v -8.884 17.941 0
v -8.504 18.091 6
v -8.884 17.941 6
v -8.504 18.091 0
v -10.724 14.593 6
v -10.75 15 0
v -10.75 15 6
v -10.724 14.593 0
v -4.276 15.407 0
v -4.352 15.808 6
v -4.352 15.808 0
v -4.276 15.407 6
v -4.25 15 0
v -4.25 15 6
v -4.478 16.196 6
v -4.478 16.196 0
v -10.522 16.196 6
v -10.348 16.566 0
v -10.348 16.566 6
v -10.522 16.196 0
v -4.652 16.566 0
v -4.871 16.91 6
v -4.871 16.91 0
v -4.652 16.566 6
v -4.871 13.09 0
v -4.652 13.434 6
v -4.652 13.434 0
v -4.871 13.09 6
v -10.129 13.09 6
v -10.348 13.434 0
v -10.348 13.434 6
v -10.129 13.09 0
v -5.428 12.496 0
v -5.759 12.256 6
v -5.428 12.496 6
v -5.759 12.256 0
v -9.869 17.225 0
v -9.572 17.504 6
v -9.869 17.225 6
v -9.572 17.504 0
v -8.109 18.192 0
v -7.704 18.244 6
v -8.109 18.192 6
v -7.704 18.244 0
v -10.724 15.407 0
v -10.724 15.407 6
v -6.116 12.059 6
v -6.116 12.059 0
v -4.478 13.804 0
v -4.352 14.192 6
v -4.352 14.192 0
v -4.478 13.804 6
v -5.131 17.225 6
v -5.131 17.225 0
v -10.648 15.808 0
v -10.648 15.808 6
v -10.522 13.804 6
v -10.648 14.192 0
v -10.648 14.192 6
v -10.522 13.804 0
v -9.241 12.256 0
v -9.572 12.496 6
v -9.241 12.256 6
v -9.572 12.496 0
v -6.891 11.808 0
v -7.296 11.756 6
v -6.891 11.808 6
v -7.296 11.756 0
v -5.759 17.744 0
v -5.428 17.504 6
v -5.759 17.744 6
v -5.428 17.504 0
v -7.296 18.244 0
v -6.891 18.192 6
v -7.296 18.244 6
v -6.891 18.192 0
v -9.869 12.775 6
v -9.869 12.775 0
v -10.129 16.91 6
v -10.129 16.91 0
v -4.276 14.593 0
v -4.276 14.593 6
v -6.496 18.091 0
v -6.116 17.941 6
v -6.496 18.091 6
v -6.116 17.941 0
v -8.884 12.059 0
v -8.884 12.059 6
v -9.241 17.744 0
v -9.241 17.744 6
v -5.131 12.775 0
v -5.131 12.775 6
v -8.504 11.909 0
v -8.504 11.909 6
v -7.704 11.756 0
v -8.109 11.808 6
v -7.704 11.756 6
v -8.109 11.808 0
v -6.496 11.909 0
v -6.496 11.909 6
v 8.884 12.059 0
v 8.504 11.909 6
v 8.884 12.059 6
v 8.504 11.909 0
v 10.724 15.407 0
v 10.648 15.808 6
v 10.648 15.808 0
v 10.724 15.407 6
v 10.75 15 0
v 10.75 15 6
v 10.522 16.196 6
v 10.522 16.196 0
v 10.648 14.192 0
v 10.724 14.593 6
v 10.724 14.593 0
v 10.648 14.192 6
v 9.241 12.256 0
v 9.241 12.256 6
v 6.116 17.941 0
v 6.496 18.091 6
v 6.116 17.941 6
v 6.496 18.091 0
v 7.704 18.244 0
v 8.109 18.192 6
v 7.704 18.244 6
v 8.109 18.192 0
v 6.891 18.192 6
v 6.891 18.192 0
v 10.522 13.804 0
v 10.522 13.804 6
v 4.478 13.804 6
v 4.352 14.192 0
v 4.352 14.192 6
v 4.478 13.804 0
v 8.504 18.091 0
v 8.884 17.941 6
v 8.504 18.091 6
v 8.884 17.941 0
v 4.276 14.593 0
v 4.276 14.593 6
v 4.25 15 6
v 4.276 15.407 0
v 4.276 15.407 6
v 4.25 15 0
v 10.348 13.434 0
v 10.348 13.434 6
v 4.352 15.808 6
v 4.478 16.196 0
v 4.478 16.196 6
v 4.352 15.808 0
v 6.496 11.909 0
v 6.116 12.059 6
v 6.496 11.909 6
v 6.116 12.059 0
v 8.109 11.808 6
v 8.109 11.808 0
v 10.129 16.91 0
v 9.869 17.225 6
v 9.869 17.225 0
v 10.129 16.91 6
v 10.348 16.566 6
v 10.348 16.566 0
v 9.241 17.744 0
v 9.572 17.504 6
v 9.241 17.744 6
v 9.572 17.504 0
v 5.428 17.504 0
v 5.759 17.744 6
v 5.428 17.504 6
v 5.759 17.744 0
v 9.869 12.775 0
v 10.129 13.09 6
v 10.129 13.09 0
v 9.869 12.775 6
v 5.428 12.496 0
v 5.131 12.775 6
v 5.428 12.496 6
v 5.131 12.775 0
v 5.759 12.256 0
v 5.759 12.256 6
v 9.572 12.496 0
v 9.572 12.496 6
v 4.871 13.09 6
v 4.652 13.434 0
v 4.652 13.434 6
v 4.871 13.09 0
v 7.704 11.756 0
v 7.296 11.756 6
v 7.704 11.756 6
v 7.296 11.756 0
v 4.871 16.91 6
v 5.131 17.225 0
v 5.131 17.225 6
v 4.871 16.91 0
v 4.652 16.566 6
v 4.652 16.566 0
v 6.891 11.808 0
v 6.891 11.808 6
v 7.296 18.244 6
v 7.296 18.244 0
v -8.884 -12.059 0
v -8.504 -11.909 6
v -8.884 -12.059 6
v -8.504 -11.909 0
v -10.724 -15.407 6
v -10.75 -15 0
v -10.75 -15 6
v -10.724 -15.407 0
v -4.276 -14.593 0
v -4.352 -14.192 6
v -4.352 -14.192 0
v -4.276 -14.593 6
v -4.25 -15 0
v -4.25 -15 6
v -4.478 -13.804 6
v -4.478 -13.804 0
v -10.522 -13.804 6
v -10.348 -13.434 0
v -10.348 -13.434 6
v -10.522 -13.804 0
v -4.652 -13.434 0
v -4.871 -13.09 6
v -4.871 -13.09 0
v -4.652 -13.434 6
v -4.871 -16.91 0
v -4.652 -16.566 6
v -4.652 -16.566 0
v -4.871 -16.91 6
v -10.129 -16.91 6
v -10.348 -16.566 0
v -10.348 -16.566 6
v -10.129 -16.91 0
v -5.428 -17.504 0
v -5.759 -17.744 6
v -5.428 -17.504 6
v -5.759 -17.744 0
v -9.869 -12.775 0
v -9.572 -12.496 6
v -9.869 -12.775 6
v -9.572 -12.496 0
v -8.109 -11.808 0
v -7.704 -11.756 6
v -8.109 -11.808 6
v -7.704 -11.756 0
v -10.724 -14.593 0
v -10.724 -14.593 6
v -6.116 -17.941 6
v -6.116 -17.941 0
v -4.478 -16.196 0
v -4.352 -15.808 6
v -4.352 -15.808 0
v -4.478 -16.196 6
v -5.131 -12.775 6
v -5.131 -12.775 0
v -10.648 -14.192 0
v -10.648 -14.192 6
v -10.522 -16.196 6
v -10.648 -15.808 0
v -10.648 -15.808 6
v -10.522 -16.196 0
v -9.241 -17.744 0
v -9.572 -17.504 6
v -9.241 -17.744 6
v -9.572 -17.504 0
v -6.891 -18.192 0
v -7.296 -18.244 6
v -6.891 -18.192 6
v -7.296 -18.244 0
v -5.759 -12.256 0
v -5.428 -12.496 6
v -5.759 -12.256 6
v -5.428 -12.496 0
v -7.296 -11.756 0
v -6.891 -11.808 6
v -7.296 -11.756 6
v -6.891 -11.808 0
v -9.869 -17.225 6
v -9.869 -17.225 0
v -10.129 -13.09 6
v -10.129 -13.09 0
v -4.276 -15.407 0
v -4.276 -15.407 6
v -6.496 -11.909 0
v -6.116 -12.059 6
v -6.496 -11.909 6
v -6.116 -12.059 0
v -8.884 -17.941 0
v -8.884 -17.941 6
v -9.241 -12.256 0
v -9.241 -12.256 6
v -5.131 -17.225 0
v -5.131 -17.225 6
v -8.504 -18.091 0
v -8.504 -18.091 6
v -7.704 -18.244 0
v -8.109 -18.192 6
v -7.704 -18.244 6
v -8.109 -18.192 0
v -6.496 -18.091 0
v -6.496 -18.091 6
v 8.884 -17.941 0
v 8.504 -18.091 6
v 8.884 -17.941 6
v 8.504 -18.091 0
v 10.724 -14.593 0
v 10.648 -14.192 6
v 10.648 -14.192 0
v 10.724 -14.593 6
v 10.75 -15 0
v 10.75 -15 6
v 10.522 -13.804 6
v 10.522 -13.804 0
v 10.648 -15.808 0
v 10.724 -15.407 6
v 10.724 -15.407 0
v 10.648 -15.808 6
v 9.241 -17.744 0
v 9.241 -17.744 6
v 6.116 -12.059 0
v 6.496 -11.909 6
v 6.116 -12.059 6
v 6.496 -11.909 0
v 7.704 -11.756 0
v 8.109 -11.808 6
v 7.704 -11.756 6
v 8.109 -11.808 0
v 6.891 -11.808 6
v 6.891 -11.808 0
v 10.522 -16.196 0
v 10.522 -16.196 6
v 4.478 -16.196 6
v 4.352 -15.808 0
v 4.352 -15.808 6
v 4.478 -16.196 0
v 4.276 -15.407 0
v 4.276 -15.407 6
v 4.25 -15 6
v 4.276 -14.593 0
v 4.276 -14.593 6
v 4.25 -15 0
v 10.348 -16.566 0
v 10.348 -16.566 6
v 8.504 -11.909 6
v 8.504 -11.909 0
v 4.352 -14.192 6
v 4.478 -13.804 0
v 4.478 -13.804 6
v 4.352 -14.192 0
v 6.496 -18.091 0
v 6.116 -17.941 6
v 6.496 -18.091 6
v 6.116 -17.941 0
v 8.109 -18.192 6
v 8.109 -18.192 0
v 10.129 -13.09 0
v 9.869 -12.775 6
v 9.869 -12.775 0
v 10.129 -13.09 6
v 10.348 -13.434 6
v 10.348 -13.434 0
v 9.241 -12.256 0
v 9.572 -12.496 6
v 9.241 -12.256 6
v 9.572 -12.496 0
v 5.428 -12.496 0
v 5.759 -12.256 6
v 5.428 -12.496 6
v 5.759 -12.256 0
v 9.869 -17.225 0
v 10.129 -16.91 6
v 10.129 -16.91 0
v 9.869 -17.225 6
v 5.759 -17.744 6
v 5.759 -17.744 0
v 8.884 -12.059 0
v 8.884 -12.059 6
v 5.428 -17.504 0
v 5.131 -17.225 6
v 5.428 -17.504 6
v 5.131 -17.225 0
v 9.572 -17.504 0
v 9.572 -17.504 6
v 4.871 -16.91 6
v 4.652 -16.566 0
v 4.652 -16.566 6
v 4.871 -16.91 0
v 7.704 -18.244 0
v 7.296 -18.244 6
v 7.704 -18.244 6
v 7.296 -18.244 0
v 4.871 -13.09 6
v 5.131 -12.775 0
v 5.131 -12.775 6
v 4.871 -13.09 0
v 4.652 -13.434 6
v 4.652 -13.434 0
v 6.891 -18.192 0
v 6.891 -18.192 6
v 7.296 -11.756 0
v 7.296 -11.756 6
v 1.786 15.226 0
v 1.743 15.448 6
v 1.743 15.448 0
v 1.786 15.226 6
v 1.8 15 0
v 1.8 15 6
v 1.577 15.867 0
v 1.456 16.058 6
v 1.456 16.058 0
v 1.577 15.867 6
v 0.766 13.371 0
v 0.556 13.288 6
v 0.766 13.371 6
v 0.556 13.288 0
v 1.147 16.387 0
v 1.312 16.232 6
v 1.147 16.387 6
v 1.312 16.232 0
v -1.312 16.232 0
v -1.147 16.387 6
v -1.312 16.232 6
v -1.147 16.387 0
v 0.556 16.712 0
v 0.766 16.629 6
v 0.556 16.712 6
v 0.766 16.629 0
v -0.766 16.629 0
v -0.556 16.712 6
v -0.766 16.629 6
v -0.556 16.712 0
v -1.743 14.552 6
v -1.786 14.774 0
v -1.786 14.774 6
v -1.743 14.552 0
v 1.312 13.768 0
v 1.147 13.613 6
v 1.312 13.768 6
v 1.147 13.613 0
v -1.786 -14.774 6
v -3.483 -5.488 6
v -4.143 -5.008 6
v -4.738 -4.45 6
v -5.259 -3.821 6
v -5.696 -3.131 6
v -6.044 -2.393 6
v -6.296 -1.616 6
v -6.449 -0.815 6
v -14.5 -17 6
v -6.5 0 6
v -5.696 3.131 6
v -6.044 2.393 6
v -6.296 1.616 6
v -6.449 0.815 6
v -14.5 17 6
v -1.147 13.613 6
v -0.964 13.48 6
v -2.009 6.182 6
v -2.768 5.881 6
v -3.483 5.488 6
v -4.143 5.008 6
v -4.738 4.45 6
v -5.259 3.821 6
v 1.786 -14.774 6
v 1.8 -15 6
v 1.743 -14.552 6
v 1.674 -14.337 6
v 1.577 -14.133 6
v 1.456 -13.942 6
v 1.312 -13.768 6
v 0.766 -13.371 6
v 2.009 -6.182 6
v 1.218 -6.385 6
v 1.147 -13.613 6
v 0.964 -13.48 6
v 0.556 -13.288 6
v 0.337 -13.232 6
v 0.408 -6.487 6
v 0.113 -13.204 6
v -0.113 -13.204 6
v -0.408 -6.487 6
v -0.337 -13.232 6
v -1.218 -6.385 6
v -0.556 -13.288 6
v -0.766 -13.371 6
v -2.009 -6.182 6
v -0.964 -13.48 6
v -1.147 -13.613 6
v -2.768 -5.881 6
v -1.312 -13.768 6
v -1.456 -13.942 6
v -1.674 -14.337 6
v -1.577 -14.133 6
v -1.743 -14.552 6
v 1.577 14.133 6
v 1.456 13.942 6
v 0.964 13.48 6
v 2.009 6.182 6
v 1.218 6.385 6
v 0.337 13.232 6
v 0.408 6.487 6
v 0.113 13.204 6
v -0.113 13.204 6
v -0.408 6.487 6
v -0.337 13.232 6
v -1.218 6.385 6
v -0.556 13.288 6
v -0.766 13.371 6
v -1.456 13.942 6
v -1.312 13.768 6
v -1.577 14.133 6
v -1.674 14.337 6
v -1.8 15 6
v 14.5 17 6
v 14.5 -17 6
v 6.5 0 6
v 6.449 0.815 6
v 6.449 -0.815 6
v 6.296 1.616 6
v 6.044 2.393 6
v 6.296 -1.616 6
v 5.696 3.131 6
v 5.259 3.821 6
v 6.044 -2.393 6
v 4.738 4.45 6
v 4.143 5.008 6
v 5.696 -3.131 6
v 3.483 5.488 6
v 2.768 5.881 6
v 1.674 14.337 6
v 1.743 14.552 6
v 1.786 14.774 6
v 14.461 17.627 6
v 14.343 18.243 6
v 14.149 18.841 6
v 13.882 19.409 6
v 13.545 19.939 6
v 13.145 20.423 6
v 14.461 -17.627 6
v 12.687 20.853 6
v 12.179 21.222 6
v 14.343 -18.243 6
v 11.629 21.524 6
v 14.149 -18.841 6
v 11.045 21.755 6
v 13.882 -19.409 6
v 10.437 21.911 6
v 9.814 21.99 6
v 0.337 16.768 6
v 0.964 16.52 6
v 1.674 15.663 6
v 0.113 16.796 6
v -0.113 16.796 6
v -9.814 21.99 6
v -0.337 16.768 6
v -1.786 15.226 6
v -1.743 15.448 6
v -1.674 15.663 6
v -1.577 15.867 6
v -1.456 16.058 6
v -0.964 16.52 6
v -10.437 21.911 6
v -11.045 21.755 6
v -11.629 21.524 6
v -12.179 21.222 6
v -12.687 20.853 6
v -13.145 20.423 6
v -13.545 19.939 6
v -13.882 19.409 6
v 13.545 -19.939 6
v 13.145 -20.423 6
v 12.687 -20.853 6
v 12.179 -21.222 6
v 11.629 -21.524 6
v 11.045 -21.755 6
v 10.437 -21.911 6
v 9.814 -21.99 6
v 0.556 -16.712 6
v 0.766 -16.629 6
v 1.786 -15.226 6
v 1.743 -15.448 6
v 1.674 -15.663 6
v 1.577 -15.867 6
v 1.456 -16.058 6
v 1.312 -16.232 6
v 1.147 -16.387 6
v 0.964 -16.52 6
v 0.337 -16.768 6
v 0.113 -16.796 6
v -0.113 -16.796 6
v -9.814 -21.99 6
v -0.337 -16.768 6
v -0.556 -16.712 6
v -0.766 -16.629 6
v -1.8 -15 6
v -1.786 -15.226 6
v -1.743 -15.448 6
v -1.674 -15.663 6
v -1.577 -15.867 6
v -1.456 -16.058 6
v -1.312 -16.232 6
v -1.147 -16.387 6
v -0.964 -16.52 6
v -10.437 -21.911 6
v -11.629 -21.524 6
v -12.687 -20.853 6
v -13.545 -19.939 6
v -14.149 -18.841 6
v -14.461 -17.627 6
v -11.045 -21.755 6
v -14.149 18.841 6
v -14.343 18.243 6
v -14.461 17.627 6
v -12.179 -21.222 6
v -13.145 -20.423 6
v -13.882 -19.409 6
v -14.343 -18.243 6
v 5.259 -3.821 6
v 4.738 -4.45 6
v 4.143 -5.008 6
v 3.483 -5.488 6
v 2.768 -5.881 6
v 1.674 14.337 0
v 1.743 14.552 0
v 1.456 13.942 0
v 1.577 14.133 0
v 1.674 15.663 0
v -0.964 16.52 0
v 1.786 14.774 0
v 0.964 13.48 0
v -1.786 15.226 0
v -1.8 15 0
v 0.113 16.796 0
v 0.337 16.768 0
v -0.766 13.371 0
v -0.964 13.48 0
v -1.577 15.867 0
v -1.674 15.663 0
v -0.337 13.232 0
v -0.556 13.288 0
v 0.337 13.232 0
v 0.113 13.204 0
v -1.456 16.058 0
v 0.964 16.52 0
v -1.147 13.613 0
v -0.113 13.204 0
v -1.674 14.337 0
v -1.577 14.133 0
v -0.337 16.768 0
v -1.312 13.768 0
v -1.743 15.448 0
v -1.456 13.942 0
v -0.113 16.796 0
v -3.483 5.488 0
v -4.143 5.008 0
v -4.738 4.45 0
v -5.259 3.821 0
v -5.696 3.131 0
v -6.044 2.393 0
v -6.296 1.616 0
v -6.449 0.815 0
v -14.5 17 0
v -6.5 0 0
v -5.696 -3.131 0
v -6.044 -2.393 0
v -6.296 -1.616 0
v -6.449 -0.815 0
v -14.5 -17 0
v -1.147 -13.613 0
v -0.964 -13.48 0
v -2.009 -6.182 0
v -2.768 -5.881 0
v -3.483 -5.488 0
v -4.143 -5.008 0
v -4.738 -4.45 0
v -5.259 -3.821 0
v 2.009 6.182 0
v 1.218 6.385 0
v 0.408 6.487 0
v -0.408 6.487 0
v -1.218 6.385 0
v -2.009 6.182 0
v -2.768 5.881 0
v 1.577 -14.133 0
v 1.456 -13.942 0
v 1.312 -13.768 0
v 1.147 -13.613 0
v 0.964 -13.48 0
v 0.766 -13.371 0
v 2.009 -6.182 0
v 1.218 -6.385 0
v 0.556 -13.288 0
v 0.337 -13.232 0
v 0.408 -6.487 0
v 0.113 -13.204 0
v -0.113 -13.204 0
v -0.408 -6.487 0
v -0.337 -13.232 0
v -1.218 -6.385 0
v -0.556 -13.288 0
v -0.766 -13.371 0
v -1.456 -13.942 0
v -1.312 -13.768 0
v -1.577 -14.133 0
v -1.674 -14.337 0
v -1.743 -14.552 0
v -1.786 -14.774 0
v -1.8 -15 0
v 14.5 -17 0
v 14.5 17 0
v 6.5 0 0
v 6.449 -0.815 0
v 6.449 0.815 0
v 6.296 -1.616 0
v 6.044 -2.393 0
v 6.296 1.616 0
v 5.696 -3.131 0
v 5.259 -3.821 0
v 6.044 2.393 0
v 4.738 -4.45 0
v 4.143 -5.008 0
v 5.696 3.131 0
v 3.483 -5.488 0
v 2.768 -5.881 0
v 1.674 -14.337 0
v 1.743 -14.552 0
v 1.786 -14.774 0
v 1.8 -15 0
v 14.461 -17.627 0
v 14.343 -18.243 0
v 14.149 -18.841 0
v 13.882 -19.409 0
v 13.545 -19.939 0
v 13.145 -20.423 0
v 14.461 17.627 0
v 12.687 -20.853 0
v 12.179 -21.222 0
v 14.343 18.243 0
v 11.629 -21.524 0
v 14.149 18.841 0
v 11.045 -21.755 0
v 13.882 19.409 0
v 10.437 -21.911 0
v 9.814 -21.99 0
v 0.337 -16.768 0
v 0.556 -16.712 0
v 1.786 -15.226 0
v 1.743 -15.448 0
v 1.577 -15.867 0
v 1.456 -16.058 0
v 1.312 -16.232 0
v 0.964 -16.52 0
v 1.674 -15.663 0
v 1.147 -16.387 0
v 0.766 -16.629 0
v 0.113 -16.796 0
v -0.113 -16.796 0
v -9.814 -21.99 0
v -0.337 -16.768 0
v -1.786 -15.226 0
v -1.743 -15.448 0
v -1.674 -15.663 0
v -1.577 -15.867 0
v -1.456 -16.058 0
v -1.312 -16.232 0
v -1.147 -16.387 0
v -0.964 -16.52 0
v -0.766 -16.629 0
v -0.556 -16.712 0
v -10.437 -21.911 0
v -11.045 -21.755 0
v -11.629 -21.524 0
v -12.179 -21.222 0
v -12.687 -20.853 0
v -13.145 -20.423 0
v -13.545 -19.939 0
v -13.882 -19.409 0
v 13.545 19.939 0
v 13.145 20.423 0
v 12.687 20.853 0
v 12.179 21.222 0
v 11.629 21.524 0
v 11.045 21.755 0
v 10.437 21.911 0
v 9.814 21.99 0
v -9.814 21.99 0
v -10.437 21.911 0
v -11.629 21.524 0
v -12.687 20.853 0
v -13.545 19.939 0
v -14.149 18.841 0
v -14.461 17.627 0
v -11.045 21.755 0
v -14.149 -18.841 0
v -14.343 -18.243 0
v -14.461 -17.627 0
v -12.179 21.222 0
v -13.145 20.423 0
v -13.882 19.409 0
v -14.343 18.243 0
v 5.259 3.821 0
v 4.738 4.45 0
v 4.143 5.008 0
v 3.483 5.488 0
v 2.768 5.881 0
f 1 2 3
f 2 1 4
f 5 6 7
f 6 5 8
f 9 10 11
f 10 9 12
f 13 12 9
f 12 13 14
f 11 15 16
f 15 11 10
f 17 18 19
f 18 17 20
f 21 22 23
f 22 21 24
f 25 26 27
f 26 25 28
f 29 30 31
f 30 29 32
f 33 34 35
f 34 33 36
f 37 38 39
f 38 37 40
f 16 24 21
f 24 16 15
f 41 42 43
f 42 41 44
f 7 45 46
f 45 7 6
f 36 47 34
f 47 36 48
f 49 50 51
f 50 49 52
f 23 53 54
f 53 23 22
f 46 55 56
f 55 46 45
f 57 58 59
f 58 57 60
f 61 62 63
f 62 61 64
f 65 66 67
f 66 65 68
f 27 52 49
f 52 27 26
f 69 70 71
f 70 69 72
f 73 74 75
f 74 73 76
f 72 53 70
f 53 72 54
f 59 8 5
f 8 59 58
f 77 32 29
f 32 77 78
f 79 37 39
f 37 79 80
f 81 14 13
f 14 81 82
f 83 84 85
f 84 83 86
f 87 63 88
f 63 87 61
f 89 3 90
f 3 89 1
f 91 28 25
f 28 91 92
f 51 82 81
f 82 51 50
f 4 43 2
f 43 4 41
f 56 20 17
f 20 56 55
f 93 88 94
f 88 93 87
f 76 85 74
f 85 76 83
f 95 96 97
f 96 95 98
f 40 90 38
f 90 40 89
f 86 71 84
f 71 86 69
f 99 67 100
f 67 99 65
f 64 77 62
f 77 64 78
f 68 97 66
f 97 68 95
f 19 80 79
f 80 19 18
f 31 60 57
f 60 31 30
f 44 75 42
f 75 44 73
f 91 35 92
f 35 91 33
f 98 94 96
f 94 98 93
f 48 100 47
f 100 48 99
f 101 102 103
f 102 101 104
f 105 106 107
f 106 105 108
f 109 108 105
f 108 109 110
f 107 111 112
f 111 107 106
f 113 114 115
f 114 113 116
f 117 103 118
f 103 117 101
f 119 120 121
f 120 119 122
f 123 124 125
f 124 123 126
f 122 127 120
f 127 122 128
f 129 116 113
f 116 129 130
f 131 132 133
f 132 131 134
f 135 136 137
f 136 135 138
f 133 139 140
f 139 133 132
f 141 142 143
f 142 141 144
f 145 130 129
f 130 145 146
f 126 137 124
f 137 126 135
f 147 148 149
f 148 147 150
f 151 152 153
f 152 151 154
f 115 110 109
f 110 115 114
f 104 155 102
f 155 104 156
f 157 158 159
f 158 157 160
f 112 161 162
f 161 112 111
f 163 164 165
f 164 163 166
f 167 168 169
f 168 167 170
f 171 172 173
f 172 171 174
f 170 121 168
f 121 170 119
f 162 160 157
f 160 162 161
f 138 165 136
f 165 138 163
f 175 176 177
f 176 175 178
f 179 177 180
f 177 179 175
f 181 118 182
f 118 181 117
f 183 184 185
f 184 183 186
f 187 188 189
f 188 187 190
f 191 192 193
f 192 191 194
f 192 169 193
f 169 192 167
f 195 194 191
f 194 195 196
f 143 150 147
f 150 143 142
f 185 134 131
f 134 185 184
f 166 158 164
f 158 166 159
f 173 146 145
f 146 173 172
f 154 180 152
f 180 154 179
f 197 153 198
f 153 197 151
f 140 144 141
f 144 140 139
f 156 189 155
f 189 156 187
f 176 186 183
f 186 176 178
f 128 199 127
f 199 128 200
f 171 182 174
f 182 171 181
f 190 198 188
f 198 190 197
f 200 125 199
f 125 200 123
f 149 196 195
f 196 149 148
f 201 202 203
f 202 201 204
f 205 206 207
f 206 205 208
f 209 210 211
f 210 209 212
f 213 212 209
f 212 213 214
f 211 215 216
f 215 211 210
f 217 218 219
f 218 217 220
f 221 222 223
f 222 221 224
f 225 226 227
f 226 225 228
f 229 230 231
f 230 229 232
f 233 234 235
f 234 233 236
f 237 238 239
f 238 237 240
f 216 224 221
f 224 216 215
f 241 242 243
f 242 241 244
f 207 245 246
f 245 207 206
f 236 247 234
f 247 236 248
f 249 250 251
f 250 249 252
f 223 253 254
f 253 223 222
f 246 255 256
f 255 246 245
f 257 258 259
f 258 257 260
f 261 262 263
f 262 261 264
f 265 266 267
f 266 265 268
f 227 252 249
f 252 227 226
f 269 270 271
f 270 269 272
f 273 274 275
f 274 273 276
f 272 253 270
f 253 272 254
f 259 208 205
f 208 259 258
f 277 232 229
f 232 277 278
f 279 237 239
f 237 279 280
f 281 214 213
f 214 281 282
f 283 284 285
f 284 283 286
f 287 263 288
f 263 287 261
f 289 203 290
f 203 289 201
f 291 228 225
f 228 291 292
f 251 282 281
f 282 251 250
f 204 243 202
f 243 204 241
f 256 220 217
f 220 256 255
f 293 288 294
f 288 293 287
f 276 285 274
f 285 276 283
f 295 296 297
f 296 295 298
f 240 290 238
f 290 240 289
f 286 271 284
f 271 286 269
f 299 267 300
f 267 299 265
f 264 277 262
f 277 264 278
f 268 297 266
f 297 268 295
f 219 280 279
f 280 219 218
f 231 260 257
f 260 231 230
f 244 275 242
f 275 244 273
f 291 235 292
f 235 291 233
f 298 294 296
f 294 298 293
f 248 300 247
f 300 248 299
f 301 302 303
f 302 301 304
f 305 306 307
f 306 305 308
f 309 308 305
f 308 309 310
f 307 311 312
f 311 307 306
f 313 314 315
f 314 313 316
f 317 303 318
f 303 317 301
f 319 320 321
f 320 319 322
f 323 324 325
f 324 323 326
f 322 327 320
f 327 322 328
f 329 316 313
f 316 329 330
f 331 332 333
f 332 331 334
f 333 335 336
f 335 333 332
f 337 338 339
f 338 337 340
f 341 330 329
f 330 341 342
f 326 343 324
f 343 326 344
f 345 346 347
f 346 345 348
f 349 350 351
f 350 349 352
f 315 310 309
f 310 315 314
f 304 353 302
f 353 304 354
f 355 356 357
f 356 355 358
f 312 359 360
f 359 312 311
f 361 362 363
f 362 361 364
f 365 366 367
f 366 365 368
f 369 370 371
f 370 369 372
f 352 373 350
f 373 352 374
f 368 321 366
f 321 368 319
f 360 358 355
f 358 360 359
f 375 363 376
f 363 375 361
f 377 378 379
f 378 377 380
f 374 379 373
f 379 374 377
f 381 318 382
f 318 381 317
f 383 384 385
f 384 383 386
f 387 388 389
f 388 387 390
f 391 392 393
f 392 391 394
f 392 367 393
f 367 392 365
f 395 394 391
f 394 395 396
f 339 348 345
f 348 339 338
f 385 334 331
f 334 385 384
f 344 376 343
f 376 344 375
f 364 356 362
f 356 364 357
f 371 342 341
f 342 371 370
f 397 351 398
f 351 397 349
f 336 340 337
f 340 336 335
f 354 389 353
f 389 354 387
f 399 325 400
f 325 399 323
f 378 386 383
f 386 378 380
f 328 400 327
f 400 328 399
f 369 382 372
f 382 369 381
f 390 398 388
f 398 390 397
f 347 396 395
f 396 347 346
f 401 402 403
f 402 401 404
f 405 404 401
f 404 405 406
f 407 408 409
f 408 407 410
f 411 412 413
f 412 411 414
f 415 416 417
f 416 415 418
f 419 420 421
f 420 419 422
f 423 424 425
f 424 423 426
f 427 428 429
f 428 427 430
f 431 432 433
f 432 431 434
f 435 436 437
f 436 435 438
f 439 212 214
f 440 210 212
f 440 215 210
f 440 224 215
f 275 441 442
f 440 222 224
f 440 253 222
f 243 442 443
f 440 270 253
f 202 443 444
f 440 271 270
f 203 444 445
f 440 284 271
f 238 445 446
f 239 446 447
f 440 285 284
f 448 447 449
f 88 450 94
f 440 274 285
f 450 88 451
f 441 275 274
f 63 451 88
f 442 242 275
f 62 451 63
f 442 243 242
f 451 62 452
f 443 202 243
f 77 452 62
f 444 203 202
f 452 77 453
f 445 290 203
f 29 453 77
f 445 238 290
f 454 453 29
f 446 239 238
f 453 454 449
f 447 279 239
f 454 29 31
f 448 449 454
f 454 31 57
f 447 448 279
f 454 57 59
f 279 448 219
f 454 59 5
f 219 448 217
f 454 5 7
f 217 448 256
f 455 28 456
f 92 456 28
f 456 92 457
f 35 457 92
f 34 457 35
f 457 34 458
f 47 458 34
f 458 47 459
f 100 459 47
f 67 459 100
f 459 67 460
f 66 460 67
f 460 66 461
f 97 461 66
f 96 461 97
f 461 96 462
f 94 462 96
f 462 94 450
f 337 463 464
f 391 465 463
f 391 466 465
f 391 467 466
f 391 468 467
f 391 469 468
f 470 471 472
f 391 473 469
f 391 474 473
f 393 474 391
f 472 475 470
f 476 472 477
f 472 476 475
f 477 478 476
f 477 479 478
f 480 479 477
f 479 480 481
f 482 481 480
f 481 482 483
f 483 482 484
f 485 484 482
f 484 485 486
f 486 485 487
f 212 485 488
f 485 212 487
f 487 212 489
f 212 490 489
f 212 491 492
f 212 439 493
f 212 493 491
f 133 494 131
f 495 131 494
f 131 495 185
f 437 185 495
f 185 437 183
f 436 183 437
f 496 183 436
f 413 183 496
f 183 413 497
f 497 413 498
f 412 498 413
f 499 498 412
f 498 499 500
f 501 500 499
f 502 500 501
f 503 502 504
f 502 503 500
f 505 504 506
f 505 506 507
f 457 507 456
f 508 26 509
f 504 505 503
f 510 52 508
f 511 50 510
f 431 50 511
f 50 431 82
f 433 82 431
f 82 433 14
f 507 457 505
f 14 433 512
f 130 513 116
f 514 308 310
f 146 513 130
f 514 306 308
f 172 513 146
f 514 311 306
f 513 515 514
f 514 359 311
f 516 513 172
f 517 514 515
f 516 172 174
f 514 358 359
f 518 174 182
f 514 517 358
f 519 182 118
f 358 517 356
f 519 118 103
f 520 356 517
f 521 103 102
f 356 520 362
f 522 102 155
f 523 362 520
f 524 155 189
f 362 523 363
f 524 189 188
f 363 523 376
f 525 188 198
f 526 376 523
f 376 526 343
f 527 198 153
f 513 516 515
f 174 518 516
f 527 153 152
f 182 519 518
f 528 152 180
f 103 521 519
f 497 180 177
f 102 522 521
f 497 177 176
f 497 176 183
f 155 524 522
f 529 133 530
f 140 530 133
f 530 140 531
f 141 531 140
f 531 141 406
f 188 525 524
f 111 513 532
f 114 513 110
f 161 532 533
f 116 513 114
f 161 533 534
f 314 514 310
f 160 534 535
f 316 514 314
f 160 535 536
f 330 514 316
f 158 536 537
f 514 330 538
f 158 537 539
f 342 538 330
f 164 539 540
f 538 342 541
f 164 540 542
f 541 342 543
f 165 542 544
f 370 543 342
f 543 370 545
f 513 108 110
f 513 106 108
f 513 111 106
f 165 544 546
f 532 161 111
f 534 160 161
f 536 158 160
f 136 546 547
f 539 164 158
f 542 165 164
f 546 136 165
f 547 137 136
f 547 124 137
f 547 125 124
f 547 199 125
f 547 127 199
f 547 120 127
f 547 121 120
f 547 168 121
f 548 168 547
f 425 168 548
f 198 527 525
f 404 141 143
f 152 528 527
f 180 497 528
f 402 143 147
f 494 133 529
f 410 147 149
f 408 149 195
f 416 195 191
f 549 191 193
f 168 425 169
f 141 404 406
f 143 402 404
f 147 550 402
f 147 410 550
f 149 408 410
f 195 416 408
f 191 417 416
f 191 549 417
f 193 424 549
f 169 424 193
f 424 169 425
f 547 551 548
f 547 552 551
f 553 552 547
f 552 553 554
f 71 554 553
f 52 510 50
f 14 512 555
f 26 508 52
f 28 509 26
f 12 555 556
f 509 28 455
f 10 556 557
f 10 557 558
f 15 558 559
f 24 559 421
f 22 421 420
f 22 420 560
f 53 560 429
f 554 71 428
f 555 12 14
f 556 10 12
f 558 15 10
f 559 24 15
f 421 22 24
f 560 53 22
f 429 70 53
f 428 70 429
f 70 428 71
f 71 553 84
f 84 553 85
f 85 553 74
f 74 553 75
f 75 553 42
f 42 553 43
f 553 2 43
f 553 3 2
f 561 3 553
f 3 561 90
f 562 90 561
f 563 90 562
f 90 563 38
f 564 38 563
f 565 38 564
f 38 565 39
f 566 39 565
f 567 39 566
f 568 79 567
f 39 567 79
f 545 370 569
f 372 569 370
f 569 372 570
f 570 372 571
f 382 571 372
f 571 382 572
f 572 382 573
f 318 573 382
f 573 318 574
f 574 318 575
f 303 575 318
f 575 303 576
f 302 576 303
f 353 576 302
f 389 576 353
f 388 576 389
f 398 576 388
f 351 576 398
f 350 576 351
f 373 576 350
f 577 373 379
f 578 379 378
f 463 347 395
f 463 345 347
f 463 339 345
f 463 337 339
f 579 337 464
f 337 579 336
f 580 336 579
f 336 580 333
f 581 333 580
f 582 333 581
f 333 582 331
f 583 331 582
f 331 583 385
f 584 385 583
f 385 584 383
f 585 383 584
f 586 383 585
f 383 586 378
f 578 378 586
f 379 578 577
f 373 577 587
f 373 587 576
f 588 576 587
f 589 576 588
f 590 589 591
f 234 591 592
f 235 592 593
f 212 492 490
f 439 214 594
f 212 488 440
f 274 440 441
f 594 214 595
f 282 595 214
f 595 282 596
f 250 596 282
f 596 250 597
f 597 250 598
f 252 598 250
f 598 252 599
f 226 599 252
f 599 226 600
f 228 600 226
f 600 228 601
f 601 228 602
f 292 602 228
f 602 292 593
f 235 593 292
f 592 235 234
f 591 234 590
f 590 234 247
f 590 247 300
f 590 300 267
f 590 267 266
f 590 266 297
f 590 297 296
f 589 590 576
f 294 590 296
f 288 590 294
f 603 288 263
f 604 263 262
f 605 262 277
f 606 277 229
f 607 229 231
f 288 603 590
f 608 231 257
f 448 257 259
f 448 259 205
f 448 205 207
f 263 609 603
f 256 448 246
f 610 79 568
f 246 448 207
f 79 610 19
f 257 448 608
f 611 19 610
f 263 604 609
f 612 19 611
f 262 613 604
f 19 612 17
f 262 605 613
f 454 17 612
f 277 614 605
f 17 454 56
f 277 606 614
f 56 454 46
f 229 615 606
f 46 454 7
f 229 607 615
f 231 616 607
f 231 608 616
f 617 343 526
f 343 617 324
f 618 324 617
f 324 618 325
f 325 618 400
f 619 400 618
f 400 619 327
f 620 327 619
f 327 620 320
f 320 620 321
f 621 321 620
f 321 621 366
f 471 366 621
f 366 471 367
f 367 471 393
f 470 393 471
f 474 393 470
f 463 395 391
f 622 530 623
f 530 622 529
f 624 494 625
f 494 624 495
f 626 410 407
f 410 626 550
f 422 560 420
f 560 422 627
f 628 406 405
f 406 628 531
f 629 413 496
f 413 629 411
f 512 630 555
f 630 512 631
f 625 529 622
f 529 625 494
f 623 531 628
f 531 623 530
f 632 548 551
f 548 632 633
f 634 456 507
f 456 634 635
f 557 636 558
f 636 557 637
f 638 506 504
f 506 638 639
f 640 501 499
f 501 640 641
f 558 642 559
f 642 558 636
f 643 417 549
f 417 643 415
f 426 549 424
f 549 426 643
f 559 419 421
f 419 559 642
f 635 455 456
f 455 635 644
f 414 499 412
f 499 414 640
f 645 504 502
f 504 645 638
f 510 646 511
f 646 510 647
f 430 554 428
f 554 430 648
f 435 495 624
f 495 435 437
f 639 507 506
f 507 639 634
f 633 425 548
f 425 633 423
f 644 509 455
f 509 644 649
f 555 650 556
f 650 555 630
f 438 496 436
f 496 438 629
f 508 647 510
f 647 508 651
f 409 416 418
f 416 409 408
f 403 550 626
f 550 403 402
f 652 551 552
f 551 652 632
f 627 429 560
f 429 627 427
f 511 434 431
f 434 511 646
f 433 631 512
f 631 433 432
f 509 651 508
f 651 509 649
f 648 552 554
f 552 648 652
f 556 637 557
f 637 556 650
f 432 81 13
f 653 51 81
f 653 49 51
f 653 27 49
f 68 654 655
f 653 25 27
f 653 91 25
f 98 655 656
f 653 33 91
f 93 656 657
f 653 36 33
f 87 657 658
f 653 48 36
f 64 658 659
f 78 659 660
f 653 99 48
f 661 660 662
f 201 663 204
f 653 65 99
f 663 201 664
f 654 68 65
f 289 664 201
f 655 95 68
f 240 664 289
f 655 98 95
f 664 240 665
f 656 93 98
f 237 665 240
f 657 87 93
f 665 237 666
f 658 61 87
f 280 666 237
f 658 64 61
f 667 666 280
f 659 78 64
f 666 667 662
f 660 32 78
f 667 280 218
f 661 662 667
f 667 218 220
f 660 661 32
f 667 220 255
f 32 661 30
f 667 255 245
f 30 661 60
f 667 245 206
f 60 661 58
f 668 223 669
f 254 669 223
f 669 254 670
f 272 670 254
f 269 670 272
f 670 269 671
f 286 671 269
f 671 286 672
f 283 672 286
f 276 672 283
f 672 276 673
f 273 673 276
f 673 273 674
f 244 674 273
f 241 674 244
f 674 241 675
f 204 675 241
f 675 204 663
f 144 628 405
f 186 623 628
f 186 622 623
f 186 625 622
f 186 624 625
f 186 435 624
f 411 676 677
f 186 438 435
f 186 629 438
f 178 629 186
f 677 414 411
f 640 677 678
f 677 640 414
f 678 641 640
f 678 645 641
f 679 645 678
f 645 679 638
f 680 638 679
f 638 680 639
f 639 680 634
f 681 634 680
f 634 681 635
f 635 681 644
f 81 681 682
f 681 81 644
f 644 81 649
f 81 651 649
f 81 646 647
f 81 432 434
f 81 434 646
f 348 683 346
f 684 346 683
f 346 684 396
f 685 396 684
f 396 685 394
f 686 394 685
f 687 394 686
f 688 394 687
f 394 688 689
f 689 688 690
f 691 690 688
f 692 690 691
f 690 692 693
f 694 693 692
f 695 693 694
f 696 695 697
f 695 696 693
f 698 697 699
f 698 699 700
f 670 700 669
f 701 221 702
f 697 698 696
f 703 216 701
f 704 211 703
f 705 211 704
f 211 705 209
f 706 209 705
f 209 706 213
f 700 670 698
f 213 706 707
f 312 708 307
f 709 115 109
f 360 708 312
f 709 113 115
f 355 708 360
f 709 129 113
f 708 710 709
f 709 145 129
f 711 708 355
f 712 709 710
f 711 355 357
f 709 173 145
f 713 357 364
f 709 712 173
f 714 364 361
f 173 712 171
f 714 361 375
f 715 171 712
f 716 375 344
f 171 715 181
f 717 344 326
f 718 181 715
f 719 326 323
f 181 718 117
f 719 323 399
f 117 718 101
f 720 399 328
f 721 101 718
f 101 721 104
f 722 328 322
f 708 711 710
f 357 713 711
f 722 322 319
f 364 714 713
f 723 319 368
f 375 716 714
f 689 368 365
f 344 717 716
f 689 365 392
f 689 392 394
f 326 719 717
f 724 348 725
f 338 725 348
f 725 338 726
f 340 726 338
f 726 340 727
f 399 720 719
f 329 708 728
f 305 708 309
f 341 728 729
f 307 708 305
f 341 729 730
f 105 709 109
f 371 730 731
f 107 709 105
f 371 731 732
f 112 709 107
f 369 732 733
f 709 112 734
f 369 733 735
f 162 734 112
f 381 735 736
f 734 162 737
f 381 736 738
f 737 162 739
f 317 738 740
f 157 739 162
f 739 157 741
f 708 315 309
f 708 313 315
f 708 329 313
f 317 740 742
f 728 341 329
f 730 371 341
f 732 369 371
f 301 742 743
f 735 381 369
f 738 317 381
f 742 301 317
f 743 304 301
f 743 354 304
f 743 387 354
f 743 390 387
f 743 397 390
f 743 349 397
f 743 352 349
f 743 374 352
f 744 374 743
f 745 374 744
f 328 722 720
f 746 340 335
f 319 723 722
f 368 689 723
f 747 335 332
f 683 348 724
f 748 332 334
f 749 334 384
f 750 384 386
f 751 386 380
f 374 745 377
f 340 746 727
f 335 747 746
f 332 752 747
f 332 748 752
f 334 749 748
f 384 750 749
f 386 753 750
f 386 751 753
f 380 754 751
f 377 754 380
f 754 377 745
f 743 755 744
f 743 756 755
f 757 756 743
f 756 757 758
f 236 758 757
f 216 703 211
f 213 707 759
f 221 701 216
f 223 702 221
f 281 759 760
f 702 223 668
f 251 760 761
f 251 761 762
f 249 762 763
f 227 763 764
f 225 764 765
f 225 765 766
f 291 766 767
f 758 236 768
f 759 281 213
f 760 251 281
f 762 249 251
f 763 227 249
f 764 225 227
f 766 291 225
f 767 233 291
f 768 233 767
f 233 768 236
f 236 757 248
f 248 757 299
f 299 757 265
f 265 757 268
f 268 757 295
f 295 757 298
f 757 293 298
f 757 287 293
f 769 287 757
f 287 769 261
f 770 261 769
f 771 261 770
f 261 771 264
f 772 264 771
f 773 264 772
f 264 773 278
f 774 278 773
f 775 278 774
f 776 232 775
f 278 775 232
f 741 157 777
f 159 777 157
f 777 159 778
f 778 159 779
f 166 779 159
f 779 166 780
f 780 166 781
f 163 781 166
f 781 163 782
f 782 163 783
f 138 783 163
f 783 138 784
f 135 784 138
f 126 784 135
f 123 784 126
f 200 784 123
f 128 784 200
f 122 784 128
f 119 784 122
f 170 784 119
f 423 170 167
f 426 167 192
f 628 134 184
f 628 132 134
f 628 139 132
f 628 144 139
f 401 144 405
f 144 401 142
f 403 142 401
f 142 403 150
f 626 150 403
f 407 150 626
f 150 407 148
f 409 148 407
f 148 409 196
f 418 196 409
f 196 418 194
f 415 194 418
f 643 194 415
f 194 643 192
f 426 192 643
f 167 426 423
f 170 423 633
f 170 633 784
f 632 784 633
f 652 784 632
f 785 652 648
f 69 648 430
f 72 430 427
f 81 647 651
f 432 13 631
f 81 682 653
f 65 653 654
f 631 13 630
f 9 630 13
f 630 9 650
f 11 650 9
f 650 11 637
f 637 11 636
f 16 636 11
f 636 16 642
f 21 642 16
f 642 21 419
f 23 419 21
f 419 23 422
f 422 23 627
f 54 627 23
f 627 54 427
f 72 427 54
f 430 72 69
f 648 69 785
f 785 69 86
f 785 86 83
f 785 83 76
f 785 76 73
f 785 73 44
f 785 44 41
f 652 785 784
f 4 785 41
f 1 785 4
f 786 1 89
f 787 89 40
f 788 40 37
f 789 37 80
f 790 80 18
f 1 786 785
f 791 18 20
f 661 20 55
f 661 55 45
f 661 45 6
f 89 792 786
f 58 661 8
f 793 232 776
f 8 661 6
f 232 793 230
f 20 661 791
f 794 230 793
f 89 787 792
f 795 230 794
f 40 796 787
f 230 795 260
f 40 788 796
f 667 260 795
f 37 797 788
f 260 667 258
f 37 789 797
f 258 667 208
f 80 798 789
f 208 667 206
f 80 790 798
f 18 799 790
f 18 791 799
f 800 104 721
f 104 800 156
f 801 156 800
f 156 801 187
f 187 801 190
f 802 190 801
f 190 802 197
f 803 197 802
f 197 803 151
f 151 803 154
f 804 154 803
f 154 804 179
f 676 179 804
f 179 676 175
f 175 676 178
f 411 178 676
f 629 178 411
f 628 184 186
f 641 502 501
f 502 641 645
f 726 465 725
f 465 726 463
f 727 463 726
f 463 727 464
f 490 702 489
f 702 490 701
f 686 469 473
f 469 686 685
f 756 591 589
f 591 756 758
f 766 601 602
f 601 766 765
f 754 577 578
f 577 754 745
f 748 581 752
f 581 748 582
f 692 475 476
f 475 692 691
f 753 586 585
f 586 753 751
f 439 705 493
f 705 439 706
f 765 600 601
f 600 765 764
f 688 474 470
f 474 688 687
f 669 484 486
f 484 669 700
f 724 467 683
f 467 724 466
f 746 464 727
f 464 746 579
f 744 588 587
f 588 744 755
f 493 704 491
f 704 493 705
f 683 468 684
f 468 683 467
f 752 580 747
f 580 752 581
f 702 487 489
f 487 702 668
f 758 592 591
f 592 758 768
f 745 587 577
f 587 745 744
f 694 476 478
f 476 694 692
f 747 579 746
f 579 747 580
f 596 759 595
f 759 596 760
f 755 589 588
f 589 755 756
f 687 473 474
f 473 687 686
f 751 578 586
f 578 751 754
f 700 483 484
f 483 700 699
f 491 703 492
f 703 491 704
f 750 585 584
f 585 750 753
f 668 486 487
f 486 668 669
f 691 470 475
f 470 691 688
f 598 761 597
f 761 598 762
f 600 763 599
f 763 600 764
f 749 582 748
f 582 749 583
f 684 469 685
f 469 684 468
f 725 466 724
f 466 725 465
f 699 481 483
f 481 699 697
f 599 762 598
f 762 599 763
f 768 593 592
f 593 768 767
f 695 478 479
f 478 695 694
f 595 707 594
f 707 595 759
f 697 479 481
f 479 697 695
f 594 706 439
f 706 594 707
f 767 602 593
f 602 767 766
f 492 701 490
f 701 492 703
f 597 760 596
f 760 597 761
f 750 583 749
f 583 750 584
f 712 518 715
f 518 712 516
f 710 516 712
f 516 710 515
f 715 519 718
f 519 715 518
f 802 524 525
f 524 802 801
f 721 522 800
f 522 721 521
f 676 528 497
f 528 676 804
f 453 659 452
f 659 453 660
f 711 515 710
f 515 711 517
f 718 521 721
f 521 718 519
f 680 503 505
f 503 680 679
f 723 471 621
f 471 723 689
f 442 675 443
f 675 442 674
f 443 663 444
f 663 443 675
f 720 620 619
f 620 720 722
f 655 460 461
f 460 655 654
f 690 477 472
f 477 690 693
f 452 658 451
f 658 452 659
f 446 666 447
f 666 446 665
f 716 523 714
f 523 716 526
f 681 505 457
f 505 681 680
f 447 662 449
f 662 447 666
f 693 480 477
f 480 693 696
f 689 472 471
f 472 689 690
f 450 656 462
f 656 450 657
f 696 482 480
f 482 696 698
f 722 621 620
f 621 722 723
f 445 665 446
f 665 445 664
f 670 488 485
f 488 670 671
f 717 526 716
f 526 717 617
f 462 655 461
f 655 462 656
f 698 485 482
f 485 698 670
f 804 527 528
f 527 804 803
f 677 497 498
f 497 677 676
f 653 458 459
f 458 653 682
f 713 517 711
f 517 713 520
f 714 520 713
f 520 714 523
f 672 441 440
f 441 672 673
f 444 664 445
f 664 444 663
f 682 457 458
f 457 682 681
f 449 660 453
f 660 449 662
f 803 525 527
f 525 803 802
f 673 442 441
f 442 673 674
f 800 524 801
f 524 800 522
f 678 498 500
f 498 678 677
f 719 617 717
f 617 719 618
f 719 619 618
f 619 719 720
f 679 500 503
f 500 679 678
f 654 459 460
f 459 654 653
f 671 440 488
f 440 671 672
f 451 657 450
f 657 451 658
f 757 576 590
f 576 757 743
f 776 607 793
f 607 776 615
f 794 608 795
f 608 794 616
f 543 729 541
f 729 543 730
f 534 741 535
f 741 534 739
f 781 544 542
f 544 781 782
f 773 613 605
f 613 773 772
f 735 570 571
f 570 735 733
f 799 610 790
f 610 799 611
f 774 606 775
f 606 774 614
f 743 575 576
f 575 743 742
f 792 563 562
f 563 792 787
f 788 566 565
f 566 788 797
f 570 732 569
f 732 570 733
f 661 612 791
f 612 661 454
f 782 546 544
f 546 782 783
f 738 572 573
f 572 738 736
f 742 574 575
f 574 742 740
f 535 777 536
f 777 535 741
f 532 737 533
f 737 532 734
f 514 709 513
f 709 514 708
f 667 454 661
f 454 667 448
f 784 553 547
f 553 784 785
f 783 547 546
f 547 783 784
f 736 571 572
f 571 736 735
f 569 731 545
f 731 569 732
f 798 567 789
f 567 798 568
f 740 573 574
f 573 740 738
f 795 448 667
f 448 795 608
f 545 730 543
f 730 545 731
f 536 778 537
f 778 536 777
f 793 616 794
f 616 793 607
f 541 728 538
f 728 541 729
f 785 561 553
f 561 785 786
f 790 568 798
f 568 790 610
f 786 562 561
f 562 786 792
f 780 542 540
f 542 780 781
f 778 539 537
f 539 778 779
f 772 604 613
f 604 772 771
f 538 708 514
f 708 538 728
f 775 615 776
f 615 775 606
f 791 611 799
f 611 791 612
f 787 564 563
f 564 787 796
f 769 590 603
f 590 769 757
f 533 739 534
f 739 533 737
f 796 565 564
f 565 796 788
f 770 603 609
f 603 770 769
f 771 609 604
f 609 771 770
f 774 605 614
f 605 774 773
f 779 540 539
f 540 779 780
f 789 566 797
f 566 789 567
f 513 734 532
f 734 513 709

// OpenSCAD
$fn = 50;


difference() {
	union() {
		hull() {
			translate(v = [-9.5000000000, 17.0000000000, 0]) {
				cylinder(h = 6, r = 5);
			}
			translate(v = [9.5000000000, 17.0000000000, 0]) {
				cylinder(h = 6, r = 5);
			}
			translate(v = [-9.5000000000, -17.0000000000, 0]) {
				cylinder(h = 6, r = 5);
			}
			translate(v = [9.5000000000, -17.0000000000, 0]) {
				cylinder(h = 6, r = 5);
			}
		}
	}
	union() {
		#translate(v = [-7.5000000000, 15.0000000000, 0]) {
			cylinder(h = 6, r = 3.2500000000);
		}
		#translate(v = [7.5000000000, 15.0000000000, 0]) {
			cylinder(h = 6, r = 3.2500000000);
		}
		#translate(v = [-7.5000000000, -15.0000000000, 0]) {
			cylinder(h = 6, r = 3.2500000000);
		}
		#translate(v = [7.5000000000, -15.0000000000, 0]) {
			cylinder(h = 6, r = 3.2500000000);
		}
		#translate(v = [-7.5000000000, -15.0000000000, -100.0000000000]) {
			cylinder(h = 200, r = 3.2500000000);
		}
		#translate(v = [-7.5000000000, 15.0000000000, -100.0000000000]) {
			cylinder(h = 200, r = 3.2500000000);
		}
		#translate(v = [7.5000000000, -15.0000000000, -100.0000000000]) {
			cylinder(h = 200, r = 3.2500000000);
		}
		#translate(v = [7.5000000000, 15.0000000000, -100.0000000000]) {
			cylinder(h = 200, r = 3.2500000000);
		}
		#translate(v = [-7.5000000000, 15.0000000000, 0]) {
			cylinder(h = 6, r = 1.8000000000);
		}
		#translate(v = [0.0000000000, 15.0000000000, 0]) {
			cylinder(h = 6, r = 1.8000000000);
		}
		#translate(v = [7.5000000000, 15.0000000000, 0]) {
			cylinder(h = 6, r = 1.8000000000);
		}
		#translate(v = [-7.5000000000, -15.0000000000, 0]) {
			cylinder(h = 6, r = 1.8000000000);
		}
		#translate(v = [0.0000000000, -15.0000000000, 0]) {
			cylinder(h = 6, r = 1.8000000000);
		}
		#translate(v = [7.5000000000, -15.0000000000, 0]) {
			cylinder(h = 6, r = 1.8000000000);
		}
		#translate(v = [-7.5000000000, 15.0000000000, 0]) {
			cylinder(h = 6, r = 1.8000000000);
		}
		#translate(v = [0.0000000000, 15.0000000000, 0]) {
			cylinder(h = 6, r = 1.8000000000);
		}
		#translate(v = [7.5000000000, 15.0000000000, 0]) {
			cylinder(h = 6, r = 1.8000000000);
		}
		#translate(v = [-7.5000000000, -15.0000000000, 0]) {
			cylinder(h = 6, r = 1.8000000000);
		}
		#translate(v = [0.0000000000, -15.0000000000, 0]) {
			cylinder(h = 6, r = 1.8000000000);
		}
		#translate(v = [7.5000000000, -15.0000000000, 0]) {
			cylinder(h = 6, r = 1.8000000000);
		}
		#translate(v = [-7.5000000000, 15.0000000000, 0]) {
			cylinder(h = 6, r = 1.8000000000);
		}
		#translate(v = [0.0000000000, 15.0000000000, 0]) {
			cylinder(h = 6, r = 1.8000000000);
		}
		#translate(v = [7.5000000000, 15.0000000000, 0]) {
			cylinder(h = 6, r = 1.8000000000);
		}
		#translate(v = [-7.5000000000, -15.0000000000, 0]) {
			cylinder(h = 6, r = 1.8000000000);
		}
		#translate(v = [0.0000000000, -15.0000000000, 0]) {
			cylinder(h = 6, r = 1.8000000000);
		}
		#translate(v = [7.5000000000, -15.0000000000, 0]) {
			cylinder(h = 6, r = 1.8000000000);
		}
		#cylinder(h = 6, r = 6.5000000000);
	}
}
